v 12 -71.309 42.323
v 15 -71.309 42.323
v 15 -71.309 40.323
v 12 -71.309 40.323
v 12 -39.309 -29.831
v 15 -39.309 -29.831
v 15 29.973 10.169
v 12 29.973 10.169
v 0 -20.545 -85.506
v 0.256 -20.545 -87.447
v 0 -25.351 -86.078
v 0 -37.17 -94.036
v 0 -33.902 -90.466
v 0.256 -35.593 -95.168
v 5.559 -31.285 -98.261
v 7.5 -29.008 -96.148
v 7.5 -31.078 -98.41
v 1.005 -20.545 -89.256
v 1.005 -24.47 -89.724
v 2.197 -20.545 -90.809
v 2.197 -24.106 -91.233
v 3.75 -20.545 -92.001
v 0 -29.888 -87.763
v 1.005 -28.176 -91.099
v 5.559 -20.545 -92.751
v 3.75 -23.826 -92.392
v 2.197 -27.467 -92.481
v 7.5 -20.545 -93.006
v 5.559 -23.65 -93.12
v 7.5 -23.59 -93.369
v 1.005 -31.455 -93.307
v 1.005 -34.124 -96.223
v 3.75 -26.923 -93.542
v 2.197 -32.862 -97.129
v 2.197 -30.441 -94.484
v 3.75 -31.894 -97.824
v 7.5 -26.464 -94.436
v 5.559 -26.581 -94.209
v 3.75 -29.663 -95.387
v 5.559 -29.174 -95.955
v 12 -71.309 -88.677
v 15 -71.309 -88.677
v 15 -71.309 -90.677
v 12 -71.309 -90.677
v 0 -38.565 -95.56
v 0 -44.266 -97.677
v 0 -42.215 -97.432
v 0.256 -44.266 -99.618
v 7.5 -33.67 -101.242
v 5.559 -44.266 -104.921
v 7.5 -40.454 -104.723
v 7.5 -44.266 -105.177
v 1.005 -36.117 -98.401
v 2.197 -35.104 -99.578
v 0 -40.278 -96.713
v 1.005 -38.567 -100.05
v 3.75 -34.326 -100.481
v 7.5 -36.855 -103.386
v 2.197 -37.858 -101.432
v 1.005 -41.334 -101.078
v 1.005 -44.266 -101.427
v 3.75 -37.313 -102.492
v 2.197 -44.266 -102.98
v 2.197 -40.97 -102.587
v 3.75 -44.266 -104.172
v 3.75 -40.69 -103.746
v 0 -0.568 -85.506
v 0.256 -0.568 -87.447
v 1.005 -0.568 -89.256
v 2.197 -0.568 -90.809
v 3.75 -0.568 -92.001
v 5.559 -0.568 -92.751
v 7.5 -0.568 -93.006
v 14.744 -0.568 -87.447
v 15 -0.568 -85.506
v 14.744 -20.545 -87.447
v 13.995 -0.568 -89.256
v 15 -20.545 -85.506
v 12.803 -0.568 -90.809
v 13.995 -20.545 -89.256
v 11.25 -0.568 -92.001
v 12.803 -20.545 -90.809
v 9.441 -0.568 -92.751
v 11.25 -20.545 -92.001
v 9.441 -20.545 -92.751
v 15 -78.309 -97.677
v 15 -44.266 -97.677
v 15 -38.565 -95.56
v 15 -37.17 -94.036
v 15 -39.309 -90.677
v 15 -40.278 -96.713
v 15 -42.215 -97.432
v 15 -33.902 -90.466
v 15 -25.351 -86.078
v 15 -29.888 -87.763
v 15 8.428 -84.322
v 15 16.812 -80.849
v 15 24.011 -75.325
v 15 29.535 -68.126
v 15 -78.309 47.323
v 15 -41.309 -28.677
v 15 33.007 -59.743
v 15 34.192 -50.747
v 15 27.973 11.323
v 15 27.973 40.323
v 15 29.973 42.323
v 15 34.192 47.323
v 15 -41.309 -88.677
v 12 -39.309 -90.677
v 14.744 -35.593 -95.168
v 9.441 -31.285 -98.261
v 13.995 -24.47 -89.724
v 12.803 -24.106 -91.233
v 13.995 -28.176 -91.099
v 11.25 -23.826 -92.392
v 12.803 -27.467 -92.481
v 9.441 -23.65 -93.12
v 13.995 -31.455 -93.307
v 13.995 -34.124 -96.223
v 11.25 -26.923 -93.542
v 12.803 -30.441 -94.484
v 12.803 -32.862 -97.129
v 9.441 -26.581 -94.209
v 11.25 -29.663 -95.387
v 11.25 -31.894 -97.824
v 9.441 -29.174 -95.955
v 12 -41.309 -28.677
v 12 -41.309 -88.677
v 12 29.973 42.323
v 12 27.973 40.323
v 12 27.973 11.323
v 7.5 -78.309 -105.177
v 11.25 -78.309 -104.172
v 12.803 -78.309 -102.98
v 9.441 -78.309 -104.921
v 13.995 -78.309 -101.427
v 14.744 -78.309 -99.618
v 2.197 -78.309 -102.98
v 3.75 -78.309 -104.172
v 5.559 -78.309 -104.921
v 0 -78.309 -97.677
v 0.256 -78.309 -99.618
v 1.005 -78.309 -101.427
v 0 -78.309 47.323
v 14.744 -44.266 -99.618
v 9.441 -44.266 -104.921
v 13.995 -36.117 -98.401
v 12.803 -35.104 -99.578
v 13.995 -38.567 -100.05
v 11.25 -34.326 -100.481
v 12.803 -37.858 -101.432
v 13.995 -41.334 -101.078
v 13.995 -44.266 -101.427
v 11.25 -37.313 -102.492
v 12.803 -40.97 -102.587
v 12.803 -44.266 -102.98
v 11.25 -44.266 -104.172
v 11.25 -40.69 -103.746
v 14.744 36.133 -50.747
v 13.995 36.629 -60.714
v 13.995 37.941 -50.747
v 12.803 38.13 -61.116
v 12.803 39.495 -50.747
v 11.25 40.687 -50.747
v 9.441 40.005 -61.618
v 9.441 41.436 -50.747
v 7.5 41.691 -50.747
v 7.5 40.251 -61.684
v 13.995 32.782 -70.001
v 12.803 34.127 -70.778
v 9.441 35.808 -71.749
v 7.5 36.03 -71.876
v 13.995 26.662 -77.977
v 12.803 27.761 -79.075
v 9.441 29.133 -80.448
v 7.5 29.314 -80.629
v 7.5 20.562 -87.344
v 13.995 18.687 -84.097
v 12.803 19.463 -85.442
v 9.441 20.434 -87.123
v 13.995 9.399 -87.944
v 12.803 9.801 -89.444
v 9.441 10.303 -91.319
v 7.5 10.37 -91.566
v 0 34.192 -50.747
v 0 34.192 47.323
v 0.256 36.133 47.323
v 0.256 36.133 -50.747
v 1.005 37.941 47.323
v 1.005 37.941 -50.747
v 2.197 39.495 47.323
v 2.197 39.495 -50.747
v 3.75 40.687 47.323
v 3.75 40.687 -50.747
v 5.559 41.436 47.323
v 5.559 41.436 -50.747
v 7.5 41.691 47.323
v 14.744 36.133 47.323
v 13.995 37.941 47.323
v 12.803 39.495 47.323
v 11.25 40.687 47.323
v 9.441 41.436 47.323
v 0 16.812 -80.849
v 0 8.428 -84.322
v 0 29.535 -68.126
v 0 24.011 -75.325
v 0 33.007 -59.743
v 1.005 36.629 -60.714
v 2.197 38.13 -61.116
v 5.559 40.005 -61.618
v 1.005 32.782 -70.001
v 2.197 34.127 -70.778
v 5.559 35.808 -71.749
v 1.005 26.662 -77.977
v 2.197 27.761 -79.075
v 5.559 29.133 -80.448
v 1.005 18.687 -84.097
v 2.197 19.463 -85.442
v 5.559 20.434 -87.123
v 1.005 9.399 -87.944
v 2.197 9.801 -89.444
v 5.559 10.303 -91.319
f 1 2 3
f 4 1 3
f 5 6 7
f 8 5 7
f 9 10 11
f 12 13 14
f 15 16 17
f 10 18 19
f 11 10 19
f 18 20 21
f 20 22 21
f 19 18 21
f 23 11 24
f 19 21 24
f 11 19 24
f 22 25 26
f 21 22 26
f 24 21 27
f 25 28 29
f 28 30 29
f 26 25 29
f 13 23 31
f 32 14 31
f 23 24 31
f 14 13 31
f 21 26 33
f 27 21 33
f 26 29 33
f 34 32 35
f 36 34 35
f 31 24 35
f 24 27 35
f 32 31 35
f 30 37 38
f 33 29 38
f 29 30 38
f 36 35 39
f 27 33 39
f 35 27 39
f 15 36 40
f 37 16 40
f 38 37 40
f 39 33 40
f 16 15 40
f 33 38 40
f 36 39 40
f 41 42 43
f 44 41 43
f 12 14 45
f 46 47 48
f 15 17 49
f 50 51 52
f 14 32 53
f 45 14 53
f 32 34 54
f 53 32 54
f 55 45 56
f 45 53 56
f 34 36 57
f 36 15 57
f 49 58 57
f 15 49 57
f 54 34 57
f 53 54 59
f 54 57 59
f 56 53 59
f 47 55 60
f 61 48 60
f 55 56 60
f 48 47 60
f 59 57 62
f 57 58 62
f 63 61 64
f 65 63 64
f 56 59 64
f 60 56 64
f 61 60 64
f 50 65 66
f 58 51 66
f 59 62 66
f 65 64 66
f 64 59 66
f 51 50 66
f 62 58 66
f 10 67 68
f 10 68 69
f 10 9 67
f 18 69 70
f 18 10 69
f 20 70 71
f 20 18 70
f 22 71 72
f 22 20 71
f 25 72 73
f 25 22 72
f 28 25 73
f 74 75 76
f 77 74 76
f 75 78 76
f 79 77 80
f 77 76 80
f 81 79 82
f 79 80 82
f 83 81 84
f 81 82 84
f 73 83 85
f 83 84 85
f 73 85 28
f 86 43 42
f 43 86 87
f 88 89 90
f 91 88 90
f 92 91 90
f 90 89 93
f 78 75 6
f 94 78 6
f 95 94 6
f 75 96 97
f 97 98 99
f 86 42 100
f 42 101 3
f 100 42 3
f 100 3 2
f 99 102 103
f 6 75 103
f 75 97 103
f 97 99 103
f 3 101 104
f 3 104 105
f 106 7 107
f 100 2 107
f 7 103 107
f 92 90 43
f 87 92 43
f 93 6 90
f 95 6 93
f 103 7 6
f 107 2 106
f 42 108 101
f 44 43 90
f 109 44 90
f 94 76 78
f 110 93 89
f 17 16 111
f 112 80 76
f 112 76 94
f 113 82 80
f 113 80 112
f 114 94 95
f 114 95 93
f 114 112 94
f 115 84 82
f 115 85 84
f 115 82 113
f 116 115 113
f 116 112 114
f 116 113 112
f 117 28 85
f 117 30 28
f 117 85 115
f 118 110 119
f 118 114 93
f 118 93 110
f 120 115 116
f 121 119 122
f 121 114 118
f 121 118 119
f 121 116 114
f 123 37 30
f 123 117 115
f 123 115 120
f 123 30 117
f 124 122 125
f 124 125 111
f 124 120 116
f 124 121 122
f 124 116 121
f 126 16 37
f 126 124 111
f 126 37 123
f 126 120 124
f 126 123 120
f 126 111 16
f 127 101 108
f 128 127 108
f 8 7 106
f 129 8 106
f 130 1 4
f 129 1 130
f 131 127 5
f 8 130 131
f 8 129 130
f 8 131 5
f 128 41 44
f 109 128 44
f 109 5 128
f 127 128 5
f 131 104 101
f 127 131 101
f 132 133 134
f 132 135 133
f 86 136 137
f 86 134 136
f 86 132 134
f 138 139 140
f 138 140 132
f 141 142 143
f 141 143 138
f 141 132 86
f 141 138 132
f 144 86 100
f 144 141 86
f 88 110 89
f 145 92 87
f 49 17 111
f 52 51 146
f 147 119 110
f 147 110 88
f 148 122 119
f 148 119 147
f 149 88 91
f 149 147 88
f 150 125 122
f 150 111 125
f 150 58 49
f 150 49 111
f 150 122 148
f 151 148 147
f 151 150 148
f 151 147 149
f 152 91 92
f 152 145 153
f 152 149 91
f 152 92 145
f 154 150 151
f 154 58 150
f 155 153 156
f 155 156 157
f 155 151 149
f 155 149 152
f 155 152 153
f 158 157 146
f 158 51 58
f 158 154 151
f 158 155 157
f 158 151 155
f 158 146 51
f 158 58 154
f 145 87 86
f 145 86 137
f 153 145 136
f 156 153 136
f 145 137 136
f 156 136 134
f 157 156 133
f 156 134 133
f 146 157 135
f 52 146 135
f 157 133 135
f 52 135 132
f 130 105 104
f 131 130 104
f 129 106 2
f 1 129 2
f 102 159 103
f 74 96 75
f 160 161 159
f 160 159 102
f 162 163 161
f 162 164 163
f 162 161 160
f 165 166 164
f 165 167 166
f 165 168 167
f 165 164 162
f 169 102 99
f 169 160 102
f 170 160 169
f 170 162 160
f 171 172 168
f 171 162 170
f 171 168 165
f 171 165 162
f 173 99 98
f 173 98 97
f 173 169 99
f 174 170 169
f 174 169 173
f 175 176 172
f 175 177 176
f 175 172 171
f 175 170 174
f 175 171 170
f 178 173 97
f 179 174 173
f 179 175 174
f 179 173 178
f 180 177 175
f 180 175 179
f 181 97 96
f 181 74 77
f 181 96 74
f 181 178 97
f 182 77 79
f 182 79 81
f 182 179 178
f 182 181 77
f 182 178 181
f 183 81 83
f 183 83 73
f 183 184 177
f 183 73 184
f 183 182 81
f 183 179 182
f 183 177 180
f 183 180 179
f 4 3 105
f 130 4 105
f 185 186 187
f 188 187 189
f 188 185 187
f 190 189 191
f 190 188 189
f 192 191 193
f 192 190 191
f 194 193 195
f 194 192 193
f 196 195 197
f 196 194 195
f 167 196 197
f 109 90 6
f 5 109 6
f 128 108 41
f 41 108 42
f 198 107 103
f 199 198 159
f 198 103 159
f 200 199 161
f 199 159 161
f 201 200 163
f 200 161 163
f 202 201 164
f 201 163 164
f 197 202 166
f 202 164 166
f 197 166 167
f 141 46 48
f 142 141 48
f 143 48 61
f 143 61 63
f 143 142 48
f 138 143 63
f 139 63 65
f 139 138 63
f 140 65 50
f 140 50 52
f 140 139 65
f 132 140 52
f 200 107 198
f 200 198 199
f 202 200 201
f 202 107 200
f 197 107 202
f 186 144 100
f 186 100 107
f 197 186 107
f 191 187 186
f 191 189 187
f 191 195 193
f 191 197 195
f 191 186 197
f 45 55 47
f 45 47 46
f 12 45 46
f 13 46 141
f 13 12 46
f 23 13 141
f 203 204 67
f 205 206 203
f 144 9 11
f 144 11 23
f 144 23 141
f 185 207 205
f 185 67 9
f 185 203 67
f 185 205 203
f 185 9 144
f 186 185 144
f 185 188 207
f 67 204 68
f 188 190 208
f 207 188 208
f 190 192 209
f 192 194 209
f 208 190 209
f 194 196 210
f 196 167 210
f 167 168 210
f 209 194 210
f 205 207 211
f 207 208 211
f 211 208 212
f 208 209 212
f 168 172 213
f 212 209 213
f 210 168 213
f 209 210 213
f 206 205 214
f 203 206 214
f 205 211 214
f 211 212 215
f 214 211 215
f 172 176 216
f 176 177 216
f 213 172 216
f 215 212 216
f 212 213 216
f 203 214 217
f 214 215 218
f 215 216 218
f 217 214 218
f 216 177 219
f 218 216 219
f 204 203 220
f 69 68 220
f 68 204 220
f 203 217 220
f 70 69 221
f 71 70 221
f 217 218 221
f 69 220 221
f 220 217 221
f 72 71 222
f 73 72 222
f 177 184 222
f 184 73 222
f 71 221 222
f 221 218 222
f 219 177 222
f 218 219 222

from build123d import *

# Parameters (mm, degrees)
BOSS_EXTRUDE1_DEPTH = 15
CUT_EXTRUDE4_DEPTH  = 3
FILLET1_R           = 7.5


with BuildPart() as part:
    # Sketch1 → Boss-Extrude1 (new body)
    with BuildSketch(Plane(origin=(0, 0, 0), x_dir=(0, 0, -1), z_dir=(1, 0, 0))):
        with BuildLine():
            Line((105.176560834, -44.266250702), (105.176560834, -78.308566478))
            Line((105.176560834, -78.308566478), (-47.323439166, -78.308566478))
            Line((-47.323439166, -78.308566478), (-47.323439166, 41.691433522))
            Line((-47.323439166, 41.691433522), (50.746660587, 41.691433522))
            ThreePointArc((50.746660587, 41.691433522), (80.628611175, 29.313924319), (93.006120378, -0.568026269))
            Line((93.006120378, -0.568026269), (93.006120378, -20.545339005))
            ThreePointArc((93.006120378, -20.545339005), (94.435922822, -26.464268202), (98.409995921, -31.077813571))
            ThreePointArc((98.409995921, -31.077813571), (103.386206676, -36.854751618), (105.176560834, -44.266250702))
        make_face()
    extrude(amount=BOSS_EXTRUDE1_DEPTH)

    # Sketch3 → Cut-Extrude4 (cut)
    with BuildSketch(Plane(origin=(15, 0, 0), x_dir=(0, 0, -1), z_dir=(1, 0, 0))):
        Polygon((90.676560834, -71.308566478), (90.676560834, -39.308566478), (29.831261372, -39.308566478), (-10.168738628, 29.973465825), (-42.323439166, 29.973465825), (-42.323439166, -71.308566478), (-40.323439166, -71.308566478), (-40.323439166, 27.973465825), (-11.323439166, 27.973465825), (28.676560834, -41.308566478), (88.676560834, -41.308566478), (88.676560834, -71.308566478), align=None)
    extrude(amount=-CUT_EXTRUDE4_DEPTH, mode=Mode.SUBTRACT)

    # Fillet1
    fillet1_edges = [part.edges().sort_by_distance(p)[0] for p in [
        (15, 29.313924319, -80.628611175),
        (0, -10.556682637, -93.006120378),
        (0, -26.464268202, -94.435922822),
        (15, 41.691433522, -1.711610711),
        (15, -61.28740859, -105.176560834),
        (15, -36.854751618, -103.386206676),
        (15, -10.556682637, -93.006120378),
        (0, -61.28740859, -105.176560834),
        (0, 41.691433522, -1.711610711),
    ]]
    fillet(fillet1_edges, radius=FILLET1_R - 0.0001)  # a hair under: the kernel refuses the full size


solid = part.part
